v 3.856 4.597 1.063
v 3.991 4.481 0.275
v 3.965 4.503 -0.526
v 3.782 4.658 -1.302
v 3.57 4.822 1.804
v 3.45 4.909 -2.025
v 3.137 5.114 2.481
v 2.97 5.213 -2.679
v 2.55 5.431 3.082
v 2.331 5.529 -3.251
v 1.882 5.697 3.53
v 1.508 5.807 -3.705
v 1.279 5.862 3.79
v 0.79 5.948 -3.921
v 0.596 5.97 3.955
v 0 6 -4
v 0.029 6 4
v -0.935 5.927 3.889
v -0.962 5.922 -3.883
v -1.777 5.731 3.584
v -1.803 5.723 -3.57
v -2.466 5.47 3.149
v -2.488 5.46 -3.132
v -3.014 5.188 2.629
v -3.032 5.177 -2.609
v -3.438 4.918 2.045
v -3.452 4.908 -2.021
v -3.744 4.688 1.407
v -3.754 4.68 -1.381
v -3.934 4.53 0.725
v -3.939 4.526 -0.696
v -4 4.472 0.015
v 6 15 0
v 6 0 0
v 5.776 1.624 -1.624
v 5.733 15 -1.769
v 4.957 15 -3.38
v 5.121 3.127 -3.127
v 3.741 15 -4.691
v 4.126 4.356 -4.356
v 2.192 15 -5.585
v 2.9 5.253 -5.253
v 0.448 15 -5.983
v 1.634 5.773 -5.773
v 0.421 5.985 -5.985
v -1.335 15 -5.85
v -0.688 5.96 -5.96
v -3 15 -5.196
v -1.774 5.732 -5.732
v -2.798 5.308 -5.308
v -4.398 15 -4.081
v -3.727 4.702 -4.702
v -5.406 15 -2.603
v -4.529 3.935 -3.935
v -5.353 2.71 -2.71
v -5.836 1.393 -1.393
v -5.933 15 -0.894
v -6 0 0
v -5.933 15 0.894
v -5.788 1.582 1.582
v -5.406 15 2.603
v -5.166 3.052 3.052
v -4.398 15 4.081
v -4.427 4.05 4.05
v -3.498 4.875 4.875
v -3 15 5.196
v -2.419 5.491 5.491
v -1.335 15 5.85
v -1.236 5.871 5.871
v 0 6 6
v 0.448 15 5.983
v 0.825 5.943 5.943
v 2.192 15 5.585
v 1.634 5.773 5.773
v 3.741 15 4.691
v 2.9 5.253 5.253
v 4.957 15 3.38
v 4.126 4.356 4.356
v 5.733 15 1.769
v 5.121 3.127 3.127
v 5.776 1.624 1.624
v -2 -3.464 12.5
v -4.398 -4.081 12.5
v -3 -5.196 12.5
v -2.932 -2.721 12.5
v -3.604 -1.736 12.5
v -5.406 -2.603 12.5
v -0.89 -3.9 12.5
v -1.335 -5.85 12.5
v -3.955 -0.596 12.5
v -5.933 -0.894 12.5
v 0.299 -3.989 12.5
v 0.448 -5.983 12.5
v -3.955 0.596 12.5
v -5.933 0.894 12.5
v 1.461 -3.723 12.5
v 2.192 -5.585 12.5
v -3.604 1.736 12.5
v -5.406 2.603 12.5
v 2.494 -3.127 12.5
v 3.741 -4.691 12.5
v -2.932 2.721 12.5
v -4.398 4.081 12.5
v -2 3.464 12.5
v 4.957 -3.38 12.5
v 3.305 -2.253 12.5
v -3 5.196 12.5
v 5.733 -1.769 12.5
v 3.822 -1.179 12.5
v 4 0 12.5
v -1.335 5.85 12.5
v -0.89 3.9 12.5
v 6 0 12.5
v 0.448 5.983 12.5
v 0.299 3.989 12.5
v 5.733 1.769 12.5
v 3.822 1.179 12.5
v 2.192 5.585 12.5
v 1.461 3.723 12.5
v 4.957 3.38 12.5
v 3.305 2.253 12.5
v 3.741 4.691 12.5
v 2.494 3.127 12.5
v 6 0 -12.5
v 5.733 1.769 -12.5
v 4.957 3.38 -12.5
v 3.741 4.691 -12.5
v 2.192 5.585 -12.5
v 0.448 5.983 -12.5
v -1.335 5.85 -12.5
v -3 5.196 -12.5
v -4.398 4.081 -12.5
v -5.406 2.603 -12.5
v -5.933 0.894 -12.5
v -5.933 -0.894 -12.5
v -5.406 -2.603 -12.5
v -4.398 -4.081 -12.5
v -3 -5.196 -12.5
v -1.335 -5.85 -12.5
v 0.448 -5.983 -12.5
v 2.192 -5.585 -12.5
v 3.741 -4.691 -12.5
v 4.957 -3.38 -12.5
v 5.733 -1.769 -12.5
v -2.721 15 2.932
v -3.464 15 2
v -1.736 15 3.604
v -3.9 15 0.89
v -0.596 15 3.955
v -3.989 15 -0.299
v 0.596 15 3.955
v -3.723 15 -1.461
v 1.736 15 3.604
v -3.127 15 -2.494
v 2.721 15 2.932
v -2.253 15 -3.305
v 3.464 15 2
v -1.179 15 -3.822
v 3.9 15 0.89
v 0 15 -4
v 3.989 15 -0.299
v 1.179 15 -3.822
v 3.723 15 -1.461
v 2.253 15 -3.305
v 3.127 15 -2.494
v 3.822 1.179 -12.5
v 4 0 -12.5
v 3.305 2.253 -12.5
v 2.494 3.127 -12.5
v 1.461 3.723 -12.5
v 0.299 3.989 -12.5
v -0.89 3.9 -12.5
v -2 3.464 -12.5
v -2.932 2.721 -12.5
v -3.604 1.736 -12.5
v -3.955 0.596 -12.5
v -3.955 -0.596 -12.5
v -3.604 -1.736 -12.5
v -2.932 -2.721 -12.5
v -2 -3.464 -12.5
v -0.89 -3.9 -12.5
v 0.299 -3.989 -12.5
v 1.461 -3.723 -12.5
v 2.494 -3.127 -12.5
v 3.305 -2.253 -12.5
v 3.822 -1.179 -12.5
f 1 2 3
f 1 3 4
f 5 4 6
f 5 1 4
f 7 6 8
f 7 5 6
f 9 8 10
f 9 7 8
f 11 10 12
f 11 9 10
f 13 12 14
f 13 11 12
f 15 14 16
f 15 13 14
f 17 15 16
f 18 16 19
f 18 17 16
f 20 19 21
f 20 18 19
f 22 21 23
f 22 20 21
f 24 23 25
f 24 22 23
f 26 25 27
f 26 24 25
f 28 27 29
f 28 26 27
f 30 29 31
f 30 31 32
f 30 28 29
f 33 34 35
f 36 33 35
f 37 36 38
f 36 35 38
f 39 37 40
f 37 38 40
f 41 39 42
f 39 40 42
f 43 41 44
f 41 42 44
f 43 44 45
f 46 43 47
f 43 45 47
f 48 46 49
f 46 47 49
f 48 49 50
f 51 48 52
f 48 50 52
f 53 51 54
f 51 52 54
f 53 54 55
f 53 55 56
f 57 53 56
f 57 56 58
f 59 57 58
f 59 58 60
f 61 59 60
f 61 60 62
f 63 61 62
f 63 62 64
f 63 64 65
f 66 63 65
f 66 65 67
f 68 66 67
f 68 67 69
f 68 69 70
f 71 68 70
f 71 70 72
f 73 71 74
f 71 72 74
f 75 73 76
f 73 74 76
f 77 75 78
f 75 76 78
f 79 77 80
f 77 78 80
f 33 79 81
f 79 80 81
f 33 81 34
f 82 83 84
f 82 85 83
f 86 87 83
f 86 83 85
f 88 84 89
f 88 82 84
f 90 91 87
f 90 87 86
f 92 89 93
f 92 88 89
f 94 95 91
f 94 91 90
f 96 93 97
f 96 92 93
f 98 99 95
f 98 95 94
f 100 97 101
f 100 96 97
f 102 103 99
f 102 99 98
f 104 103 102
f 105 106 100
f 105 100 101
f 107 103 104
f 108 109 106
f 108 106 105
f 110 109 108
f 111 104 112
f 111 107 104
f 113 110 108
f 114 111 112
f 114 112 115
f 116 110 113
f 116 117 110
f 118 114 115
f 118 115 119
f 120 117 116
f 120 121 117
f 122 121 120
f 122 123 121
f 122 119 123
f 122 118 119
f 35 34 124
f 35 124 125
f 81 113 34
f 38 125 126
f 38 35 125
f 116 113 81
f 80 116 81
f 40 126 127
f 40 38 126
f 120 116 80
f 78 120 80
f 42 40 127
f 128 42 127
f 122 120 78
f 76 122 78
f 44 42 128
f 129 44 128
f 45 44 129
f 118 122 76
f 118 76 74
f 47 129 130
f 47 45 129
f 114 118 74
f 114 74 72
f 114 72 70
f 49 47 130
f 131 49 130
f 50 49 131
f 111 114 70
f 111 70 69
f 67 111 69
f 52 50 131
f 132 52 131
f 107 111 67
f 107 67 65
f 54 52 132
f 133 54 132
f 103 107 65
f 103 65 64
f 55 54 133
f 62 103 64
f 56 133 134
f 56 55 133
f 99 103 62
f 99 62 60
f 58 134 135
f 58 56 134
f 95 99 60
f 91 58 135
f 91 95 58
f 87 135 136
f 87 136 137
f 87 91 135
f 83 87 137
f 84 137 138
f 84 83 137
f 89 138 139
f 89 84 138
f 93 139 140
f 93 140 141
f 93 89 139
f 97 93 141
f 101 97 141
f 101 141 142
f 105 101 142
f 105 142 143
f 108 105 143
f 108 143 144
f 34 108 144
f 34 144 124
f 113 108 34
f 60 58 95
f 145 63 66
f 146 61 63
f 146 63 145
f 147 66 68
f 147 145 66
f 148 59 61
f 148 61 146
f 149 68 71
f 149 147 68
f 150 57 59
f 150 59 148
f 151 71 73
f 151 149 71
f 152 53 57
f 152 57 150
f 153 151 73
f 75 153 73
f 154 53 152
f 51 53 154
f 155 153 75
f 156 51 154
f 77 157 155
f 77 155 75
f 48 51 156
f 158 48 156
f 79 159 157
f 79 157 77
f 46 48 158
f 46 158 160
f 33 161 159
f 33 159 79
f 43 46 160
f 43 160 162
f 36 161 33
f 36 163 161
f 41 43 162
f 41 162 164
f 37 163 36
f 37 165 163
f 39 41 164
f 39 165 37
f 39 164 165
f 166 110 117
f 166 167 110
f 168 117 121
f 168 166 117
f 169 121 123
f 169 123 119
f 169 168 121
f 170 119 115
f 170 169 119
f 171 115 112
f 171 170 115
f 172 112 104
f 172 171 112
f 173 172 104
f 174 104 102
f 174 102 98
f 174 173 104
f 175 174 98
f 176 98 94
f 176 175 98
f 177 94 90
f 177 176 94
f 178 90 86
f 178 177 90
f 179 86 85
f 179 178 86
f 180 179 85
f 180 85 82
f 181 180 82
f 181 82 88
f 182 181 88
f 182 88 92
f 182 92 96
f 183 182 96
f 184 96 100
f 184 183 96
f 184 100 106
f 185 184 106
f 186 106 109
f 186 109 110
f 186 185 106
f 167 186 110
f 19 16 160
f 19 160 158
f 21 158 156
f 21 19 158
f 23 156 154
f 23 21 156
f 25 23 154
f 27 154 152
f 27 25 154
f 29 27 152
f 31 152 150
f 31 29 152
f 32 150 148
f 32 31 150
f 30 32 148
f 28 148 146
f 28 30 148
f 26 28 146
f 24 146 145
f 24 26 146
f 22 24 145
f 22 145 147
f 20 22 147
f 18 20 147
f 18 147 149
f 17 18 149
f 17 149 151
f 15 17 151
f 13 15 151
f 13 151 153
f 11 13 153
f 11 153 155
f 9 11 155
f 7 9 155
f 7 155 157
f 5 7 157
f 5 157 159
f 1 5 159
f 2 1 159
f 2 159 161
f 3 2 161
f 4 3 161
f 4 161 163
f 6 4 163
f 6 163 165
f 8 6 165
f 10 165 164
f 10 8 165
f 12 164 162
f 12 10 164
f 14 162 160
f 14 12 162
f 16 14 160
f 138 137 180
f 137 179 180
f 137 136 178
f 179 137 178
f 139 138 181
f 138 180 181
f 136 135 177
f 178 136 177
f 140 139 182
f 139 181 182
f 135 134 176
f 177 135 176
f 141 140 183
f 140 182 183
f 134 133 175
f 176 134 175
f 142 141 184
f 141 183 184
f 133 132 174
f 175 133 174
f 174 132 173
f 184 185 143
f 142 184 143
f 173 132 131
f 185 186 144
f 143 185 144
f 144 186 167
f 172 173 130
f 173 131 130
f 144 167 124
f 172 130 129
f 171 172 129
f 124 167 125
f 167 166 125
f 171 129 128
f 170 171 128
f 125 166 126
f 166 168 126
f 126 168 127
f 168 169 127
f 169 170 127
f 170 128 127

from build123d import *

# Parameters (mm, degrees)
SKETCH1_R           = 6
SKETCH1_R_2         = 4
BOSS_EXTRUDE1_DEPTH = 12.5
SKETCH2_R           = 6
SKETCH2_R_2         = 4
BOSS_EXTRUDE2_DEPTH = 15
CUT_EXTRUDE1_START  = -25
SKETCH3_R           = 4
CUT_EXTRUDE1_DEPTH  = 25


with BuildPart() as part:
    # Sketch1 → Boss-Extrude1 (new, symmetric)
    with BuildSketch(Plane.XY):
        Circle(SKETCH1_R)
        Circle(SKETCH1_R_2, mode=Mode.SUBTRACT)
    extrude(amount=BOSS_EXTRUDE1_DEPTH, both=True)

    # Sketch2 → Boss-Extrude2 (add)
    with BuildSketch(Plane(origin=(0, 0, 0), x_dir=(1, 0, 0), z_dir=(0, 1, 0))):
        Circle(SKETCH2_R)
        with Locations(Location((0, 0, 0), (0, 0, 90))):
            Circle(SKETCH2_R_2, mode=Mode.SUBTRACT)
    extrude(amount=BOSS_EXTRUDE2_DEPTH)

    # Sketch3 → Cut-Extrude1 (cut)
    with BuildSketch(Plane.XY.offset(12.5).offset(CUT_EXTRUDE1_START)):
        Circle(SKETCH3_R)
    extrude(amount=CUT_EXTRUDE1_DEPTH, mode=Mode.SUBTRACT)


solid = part.part
